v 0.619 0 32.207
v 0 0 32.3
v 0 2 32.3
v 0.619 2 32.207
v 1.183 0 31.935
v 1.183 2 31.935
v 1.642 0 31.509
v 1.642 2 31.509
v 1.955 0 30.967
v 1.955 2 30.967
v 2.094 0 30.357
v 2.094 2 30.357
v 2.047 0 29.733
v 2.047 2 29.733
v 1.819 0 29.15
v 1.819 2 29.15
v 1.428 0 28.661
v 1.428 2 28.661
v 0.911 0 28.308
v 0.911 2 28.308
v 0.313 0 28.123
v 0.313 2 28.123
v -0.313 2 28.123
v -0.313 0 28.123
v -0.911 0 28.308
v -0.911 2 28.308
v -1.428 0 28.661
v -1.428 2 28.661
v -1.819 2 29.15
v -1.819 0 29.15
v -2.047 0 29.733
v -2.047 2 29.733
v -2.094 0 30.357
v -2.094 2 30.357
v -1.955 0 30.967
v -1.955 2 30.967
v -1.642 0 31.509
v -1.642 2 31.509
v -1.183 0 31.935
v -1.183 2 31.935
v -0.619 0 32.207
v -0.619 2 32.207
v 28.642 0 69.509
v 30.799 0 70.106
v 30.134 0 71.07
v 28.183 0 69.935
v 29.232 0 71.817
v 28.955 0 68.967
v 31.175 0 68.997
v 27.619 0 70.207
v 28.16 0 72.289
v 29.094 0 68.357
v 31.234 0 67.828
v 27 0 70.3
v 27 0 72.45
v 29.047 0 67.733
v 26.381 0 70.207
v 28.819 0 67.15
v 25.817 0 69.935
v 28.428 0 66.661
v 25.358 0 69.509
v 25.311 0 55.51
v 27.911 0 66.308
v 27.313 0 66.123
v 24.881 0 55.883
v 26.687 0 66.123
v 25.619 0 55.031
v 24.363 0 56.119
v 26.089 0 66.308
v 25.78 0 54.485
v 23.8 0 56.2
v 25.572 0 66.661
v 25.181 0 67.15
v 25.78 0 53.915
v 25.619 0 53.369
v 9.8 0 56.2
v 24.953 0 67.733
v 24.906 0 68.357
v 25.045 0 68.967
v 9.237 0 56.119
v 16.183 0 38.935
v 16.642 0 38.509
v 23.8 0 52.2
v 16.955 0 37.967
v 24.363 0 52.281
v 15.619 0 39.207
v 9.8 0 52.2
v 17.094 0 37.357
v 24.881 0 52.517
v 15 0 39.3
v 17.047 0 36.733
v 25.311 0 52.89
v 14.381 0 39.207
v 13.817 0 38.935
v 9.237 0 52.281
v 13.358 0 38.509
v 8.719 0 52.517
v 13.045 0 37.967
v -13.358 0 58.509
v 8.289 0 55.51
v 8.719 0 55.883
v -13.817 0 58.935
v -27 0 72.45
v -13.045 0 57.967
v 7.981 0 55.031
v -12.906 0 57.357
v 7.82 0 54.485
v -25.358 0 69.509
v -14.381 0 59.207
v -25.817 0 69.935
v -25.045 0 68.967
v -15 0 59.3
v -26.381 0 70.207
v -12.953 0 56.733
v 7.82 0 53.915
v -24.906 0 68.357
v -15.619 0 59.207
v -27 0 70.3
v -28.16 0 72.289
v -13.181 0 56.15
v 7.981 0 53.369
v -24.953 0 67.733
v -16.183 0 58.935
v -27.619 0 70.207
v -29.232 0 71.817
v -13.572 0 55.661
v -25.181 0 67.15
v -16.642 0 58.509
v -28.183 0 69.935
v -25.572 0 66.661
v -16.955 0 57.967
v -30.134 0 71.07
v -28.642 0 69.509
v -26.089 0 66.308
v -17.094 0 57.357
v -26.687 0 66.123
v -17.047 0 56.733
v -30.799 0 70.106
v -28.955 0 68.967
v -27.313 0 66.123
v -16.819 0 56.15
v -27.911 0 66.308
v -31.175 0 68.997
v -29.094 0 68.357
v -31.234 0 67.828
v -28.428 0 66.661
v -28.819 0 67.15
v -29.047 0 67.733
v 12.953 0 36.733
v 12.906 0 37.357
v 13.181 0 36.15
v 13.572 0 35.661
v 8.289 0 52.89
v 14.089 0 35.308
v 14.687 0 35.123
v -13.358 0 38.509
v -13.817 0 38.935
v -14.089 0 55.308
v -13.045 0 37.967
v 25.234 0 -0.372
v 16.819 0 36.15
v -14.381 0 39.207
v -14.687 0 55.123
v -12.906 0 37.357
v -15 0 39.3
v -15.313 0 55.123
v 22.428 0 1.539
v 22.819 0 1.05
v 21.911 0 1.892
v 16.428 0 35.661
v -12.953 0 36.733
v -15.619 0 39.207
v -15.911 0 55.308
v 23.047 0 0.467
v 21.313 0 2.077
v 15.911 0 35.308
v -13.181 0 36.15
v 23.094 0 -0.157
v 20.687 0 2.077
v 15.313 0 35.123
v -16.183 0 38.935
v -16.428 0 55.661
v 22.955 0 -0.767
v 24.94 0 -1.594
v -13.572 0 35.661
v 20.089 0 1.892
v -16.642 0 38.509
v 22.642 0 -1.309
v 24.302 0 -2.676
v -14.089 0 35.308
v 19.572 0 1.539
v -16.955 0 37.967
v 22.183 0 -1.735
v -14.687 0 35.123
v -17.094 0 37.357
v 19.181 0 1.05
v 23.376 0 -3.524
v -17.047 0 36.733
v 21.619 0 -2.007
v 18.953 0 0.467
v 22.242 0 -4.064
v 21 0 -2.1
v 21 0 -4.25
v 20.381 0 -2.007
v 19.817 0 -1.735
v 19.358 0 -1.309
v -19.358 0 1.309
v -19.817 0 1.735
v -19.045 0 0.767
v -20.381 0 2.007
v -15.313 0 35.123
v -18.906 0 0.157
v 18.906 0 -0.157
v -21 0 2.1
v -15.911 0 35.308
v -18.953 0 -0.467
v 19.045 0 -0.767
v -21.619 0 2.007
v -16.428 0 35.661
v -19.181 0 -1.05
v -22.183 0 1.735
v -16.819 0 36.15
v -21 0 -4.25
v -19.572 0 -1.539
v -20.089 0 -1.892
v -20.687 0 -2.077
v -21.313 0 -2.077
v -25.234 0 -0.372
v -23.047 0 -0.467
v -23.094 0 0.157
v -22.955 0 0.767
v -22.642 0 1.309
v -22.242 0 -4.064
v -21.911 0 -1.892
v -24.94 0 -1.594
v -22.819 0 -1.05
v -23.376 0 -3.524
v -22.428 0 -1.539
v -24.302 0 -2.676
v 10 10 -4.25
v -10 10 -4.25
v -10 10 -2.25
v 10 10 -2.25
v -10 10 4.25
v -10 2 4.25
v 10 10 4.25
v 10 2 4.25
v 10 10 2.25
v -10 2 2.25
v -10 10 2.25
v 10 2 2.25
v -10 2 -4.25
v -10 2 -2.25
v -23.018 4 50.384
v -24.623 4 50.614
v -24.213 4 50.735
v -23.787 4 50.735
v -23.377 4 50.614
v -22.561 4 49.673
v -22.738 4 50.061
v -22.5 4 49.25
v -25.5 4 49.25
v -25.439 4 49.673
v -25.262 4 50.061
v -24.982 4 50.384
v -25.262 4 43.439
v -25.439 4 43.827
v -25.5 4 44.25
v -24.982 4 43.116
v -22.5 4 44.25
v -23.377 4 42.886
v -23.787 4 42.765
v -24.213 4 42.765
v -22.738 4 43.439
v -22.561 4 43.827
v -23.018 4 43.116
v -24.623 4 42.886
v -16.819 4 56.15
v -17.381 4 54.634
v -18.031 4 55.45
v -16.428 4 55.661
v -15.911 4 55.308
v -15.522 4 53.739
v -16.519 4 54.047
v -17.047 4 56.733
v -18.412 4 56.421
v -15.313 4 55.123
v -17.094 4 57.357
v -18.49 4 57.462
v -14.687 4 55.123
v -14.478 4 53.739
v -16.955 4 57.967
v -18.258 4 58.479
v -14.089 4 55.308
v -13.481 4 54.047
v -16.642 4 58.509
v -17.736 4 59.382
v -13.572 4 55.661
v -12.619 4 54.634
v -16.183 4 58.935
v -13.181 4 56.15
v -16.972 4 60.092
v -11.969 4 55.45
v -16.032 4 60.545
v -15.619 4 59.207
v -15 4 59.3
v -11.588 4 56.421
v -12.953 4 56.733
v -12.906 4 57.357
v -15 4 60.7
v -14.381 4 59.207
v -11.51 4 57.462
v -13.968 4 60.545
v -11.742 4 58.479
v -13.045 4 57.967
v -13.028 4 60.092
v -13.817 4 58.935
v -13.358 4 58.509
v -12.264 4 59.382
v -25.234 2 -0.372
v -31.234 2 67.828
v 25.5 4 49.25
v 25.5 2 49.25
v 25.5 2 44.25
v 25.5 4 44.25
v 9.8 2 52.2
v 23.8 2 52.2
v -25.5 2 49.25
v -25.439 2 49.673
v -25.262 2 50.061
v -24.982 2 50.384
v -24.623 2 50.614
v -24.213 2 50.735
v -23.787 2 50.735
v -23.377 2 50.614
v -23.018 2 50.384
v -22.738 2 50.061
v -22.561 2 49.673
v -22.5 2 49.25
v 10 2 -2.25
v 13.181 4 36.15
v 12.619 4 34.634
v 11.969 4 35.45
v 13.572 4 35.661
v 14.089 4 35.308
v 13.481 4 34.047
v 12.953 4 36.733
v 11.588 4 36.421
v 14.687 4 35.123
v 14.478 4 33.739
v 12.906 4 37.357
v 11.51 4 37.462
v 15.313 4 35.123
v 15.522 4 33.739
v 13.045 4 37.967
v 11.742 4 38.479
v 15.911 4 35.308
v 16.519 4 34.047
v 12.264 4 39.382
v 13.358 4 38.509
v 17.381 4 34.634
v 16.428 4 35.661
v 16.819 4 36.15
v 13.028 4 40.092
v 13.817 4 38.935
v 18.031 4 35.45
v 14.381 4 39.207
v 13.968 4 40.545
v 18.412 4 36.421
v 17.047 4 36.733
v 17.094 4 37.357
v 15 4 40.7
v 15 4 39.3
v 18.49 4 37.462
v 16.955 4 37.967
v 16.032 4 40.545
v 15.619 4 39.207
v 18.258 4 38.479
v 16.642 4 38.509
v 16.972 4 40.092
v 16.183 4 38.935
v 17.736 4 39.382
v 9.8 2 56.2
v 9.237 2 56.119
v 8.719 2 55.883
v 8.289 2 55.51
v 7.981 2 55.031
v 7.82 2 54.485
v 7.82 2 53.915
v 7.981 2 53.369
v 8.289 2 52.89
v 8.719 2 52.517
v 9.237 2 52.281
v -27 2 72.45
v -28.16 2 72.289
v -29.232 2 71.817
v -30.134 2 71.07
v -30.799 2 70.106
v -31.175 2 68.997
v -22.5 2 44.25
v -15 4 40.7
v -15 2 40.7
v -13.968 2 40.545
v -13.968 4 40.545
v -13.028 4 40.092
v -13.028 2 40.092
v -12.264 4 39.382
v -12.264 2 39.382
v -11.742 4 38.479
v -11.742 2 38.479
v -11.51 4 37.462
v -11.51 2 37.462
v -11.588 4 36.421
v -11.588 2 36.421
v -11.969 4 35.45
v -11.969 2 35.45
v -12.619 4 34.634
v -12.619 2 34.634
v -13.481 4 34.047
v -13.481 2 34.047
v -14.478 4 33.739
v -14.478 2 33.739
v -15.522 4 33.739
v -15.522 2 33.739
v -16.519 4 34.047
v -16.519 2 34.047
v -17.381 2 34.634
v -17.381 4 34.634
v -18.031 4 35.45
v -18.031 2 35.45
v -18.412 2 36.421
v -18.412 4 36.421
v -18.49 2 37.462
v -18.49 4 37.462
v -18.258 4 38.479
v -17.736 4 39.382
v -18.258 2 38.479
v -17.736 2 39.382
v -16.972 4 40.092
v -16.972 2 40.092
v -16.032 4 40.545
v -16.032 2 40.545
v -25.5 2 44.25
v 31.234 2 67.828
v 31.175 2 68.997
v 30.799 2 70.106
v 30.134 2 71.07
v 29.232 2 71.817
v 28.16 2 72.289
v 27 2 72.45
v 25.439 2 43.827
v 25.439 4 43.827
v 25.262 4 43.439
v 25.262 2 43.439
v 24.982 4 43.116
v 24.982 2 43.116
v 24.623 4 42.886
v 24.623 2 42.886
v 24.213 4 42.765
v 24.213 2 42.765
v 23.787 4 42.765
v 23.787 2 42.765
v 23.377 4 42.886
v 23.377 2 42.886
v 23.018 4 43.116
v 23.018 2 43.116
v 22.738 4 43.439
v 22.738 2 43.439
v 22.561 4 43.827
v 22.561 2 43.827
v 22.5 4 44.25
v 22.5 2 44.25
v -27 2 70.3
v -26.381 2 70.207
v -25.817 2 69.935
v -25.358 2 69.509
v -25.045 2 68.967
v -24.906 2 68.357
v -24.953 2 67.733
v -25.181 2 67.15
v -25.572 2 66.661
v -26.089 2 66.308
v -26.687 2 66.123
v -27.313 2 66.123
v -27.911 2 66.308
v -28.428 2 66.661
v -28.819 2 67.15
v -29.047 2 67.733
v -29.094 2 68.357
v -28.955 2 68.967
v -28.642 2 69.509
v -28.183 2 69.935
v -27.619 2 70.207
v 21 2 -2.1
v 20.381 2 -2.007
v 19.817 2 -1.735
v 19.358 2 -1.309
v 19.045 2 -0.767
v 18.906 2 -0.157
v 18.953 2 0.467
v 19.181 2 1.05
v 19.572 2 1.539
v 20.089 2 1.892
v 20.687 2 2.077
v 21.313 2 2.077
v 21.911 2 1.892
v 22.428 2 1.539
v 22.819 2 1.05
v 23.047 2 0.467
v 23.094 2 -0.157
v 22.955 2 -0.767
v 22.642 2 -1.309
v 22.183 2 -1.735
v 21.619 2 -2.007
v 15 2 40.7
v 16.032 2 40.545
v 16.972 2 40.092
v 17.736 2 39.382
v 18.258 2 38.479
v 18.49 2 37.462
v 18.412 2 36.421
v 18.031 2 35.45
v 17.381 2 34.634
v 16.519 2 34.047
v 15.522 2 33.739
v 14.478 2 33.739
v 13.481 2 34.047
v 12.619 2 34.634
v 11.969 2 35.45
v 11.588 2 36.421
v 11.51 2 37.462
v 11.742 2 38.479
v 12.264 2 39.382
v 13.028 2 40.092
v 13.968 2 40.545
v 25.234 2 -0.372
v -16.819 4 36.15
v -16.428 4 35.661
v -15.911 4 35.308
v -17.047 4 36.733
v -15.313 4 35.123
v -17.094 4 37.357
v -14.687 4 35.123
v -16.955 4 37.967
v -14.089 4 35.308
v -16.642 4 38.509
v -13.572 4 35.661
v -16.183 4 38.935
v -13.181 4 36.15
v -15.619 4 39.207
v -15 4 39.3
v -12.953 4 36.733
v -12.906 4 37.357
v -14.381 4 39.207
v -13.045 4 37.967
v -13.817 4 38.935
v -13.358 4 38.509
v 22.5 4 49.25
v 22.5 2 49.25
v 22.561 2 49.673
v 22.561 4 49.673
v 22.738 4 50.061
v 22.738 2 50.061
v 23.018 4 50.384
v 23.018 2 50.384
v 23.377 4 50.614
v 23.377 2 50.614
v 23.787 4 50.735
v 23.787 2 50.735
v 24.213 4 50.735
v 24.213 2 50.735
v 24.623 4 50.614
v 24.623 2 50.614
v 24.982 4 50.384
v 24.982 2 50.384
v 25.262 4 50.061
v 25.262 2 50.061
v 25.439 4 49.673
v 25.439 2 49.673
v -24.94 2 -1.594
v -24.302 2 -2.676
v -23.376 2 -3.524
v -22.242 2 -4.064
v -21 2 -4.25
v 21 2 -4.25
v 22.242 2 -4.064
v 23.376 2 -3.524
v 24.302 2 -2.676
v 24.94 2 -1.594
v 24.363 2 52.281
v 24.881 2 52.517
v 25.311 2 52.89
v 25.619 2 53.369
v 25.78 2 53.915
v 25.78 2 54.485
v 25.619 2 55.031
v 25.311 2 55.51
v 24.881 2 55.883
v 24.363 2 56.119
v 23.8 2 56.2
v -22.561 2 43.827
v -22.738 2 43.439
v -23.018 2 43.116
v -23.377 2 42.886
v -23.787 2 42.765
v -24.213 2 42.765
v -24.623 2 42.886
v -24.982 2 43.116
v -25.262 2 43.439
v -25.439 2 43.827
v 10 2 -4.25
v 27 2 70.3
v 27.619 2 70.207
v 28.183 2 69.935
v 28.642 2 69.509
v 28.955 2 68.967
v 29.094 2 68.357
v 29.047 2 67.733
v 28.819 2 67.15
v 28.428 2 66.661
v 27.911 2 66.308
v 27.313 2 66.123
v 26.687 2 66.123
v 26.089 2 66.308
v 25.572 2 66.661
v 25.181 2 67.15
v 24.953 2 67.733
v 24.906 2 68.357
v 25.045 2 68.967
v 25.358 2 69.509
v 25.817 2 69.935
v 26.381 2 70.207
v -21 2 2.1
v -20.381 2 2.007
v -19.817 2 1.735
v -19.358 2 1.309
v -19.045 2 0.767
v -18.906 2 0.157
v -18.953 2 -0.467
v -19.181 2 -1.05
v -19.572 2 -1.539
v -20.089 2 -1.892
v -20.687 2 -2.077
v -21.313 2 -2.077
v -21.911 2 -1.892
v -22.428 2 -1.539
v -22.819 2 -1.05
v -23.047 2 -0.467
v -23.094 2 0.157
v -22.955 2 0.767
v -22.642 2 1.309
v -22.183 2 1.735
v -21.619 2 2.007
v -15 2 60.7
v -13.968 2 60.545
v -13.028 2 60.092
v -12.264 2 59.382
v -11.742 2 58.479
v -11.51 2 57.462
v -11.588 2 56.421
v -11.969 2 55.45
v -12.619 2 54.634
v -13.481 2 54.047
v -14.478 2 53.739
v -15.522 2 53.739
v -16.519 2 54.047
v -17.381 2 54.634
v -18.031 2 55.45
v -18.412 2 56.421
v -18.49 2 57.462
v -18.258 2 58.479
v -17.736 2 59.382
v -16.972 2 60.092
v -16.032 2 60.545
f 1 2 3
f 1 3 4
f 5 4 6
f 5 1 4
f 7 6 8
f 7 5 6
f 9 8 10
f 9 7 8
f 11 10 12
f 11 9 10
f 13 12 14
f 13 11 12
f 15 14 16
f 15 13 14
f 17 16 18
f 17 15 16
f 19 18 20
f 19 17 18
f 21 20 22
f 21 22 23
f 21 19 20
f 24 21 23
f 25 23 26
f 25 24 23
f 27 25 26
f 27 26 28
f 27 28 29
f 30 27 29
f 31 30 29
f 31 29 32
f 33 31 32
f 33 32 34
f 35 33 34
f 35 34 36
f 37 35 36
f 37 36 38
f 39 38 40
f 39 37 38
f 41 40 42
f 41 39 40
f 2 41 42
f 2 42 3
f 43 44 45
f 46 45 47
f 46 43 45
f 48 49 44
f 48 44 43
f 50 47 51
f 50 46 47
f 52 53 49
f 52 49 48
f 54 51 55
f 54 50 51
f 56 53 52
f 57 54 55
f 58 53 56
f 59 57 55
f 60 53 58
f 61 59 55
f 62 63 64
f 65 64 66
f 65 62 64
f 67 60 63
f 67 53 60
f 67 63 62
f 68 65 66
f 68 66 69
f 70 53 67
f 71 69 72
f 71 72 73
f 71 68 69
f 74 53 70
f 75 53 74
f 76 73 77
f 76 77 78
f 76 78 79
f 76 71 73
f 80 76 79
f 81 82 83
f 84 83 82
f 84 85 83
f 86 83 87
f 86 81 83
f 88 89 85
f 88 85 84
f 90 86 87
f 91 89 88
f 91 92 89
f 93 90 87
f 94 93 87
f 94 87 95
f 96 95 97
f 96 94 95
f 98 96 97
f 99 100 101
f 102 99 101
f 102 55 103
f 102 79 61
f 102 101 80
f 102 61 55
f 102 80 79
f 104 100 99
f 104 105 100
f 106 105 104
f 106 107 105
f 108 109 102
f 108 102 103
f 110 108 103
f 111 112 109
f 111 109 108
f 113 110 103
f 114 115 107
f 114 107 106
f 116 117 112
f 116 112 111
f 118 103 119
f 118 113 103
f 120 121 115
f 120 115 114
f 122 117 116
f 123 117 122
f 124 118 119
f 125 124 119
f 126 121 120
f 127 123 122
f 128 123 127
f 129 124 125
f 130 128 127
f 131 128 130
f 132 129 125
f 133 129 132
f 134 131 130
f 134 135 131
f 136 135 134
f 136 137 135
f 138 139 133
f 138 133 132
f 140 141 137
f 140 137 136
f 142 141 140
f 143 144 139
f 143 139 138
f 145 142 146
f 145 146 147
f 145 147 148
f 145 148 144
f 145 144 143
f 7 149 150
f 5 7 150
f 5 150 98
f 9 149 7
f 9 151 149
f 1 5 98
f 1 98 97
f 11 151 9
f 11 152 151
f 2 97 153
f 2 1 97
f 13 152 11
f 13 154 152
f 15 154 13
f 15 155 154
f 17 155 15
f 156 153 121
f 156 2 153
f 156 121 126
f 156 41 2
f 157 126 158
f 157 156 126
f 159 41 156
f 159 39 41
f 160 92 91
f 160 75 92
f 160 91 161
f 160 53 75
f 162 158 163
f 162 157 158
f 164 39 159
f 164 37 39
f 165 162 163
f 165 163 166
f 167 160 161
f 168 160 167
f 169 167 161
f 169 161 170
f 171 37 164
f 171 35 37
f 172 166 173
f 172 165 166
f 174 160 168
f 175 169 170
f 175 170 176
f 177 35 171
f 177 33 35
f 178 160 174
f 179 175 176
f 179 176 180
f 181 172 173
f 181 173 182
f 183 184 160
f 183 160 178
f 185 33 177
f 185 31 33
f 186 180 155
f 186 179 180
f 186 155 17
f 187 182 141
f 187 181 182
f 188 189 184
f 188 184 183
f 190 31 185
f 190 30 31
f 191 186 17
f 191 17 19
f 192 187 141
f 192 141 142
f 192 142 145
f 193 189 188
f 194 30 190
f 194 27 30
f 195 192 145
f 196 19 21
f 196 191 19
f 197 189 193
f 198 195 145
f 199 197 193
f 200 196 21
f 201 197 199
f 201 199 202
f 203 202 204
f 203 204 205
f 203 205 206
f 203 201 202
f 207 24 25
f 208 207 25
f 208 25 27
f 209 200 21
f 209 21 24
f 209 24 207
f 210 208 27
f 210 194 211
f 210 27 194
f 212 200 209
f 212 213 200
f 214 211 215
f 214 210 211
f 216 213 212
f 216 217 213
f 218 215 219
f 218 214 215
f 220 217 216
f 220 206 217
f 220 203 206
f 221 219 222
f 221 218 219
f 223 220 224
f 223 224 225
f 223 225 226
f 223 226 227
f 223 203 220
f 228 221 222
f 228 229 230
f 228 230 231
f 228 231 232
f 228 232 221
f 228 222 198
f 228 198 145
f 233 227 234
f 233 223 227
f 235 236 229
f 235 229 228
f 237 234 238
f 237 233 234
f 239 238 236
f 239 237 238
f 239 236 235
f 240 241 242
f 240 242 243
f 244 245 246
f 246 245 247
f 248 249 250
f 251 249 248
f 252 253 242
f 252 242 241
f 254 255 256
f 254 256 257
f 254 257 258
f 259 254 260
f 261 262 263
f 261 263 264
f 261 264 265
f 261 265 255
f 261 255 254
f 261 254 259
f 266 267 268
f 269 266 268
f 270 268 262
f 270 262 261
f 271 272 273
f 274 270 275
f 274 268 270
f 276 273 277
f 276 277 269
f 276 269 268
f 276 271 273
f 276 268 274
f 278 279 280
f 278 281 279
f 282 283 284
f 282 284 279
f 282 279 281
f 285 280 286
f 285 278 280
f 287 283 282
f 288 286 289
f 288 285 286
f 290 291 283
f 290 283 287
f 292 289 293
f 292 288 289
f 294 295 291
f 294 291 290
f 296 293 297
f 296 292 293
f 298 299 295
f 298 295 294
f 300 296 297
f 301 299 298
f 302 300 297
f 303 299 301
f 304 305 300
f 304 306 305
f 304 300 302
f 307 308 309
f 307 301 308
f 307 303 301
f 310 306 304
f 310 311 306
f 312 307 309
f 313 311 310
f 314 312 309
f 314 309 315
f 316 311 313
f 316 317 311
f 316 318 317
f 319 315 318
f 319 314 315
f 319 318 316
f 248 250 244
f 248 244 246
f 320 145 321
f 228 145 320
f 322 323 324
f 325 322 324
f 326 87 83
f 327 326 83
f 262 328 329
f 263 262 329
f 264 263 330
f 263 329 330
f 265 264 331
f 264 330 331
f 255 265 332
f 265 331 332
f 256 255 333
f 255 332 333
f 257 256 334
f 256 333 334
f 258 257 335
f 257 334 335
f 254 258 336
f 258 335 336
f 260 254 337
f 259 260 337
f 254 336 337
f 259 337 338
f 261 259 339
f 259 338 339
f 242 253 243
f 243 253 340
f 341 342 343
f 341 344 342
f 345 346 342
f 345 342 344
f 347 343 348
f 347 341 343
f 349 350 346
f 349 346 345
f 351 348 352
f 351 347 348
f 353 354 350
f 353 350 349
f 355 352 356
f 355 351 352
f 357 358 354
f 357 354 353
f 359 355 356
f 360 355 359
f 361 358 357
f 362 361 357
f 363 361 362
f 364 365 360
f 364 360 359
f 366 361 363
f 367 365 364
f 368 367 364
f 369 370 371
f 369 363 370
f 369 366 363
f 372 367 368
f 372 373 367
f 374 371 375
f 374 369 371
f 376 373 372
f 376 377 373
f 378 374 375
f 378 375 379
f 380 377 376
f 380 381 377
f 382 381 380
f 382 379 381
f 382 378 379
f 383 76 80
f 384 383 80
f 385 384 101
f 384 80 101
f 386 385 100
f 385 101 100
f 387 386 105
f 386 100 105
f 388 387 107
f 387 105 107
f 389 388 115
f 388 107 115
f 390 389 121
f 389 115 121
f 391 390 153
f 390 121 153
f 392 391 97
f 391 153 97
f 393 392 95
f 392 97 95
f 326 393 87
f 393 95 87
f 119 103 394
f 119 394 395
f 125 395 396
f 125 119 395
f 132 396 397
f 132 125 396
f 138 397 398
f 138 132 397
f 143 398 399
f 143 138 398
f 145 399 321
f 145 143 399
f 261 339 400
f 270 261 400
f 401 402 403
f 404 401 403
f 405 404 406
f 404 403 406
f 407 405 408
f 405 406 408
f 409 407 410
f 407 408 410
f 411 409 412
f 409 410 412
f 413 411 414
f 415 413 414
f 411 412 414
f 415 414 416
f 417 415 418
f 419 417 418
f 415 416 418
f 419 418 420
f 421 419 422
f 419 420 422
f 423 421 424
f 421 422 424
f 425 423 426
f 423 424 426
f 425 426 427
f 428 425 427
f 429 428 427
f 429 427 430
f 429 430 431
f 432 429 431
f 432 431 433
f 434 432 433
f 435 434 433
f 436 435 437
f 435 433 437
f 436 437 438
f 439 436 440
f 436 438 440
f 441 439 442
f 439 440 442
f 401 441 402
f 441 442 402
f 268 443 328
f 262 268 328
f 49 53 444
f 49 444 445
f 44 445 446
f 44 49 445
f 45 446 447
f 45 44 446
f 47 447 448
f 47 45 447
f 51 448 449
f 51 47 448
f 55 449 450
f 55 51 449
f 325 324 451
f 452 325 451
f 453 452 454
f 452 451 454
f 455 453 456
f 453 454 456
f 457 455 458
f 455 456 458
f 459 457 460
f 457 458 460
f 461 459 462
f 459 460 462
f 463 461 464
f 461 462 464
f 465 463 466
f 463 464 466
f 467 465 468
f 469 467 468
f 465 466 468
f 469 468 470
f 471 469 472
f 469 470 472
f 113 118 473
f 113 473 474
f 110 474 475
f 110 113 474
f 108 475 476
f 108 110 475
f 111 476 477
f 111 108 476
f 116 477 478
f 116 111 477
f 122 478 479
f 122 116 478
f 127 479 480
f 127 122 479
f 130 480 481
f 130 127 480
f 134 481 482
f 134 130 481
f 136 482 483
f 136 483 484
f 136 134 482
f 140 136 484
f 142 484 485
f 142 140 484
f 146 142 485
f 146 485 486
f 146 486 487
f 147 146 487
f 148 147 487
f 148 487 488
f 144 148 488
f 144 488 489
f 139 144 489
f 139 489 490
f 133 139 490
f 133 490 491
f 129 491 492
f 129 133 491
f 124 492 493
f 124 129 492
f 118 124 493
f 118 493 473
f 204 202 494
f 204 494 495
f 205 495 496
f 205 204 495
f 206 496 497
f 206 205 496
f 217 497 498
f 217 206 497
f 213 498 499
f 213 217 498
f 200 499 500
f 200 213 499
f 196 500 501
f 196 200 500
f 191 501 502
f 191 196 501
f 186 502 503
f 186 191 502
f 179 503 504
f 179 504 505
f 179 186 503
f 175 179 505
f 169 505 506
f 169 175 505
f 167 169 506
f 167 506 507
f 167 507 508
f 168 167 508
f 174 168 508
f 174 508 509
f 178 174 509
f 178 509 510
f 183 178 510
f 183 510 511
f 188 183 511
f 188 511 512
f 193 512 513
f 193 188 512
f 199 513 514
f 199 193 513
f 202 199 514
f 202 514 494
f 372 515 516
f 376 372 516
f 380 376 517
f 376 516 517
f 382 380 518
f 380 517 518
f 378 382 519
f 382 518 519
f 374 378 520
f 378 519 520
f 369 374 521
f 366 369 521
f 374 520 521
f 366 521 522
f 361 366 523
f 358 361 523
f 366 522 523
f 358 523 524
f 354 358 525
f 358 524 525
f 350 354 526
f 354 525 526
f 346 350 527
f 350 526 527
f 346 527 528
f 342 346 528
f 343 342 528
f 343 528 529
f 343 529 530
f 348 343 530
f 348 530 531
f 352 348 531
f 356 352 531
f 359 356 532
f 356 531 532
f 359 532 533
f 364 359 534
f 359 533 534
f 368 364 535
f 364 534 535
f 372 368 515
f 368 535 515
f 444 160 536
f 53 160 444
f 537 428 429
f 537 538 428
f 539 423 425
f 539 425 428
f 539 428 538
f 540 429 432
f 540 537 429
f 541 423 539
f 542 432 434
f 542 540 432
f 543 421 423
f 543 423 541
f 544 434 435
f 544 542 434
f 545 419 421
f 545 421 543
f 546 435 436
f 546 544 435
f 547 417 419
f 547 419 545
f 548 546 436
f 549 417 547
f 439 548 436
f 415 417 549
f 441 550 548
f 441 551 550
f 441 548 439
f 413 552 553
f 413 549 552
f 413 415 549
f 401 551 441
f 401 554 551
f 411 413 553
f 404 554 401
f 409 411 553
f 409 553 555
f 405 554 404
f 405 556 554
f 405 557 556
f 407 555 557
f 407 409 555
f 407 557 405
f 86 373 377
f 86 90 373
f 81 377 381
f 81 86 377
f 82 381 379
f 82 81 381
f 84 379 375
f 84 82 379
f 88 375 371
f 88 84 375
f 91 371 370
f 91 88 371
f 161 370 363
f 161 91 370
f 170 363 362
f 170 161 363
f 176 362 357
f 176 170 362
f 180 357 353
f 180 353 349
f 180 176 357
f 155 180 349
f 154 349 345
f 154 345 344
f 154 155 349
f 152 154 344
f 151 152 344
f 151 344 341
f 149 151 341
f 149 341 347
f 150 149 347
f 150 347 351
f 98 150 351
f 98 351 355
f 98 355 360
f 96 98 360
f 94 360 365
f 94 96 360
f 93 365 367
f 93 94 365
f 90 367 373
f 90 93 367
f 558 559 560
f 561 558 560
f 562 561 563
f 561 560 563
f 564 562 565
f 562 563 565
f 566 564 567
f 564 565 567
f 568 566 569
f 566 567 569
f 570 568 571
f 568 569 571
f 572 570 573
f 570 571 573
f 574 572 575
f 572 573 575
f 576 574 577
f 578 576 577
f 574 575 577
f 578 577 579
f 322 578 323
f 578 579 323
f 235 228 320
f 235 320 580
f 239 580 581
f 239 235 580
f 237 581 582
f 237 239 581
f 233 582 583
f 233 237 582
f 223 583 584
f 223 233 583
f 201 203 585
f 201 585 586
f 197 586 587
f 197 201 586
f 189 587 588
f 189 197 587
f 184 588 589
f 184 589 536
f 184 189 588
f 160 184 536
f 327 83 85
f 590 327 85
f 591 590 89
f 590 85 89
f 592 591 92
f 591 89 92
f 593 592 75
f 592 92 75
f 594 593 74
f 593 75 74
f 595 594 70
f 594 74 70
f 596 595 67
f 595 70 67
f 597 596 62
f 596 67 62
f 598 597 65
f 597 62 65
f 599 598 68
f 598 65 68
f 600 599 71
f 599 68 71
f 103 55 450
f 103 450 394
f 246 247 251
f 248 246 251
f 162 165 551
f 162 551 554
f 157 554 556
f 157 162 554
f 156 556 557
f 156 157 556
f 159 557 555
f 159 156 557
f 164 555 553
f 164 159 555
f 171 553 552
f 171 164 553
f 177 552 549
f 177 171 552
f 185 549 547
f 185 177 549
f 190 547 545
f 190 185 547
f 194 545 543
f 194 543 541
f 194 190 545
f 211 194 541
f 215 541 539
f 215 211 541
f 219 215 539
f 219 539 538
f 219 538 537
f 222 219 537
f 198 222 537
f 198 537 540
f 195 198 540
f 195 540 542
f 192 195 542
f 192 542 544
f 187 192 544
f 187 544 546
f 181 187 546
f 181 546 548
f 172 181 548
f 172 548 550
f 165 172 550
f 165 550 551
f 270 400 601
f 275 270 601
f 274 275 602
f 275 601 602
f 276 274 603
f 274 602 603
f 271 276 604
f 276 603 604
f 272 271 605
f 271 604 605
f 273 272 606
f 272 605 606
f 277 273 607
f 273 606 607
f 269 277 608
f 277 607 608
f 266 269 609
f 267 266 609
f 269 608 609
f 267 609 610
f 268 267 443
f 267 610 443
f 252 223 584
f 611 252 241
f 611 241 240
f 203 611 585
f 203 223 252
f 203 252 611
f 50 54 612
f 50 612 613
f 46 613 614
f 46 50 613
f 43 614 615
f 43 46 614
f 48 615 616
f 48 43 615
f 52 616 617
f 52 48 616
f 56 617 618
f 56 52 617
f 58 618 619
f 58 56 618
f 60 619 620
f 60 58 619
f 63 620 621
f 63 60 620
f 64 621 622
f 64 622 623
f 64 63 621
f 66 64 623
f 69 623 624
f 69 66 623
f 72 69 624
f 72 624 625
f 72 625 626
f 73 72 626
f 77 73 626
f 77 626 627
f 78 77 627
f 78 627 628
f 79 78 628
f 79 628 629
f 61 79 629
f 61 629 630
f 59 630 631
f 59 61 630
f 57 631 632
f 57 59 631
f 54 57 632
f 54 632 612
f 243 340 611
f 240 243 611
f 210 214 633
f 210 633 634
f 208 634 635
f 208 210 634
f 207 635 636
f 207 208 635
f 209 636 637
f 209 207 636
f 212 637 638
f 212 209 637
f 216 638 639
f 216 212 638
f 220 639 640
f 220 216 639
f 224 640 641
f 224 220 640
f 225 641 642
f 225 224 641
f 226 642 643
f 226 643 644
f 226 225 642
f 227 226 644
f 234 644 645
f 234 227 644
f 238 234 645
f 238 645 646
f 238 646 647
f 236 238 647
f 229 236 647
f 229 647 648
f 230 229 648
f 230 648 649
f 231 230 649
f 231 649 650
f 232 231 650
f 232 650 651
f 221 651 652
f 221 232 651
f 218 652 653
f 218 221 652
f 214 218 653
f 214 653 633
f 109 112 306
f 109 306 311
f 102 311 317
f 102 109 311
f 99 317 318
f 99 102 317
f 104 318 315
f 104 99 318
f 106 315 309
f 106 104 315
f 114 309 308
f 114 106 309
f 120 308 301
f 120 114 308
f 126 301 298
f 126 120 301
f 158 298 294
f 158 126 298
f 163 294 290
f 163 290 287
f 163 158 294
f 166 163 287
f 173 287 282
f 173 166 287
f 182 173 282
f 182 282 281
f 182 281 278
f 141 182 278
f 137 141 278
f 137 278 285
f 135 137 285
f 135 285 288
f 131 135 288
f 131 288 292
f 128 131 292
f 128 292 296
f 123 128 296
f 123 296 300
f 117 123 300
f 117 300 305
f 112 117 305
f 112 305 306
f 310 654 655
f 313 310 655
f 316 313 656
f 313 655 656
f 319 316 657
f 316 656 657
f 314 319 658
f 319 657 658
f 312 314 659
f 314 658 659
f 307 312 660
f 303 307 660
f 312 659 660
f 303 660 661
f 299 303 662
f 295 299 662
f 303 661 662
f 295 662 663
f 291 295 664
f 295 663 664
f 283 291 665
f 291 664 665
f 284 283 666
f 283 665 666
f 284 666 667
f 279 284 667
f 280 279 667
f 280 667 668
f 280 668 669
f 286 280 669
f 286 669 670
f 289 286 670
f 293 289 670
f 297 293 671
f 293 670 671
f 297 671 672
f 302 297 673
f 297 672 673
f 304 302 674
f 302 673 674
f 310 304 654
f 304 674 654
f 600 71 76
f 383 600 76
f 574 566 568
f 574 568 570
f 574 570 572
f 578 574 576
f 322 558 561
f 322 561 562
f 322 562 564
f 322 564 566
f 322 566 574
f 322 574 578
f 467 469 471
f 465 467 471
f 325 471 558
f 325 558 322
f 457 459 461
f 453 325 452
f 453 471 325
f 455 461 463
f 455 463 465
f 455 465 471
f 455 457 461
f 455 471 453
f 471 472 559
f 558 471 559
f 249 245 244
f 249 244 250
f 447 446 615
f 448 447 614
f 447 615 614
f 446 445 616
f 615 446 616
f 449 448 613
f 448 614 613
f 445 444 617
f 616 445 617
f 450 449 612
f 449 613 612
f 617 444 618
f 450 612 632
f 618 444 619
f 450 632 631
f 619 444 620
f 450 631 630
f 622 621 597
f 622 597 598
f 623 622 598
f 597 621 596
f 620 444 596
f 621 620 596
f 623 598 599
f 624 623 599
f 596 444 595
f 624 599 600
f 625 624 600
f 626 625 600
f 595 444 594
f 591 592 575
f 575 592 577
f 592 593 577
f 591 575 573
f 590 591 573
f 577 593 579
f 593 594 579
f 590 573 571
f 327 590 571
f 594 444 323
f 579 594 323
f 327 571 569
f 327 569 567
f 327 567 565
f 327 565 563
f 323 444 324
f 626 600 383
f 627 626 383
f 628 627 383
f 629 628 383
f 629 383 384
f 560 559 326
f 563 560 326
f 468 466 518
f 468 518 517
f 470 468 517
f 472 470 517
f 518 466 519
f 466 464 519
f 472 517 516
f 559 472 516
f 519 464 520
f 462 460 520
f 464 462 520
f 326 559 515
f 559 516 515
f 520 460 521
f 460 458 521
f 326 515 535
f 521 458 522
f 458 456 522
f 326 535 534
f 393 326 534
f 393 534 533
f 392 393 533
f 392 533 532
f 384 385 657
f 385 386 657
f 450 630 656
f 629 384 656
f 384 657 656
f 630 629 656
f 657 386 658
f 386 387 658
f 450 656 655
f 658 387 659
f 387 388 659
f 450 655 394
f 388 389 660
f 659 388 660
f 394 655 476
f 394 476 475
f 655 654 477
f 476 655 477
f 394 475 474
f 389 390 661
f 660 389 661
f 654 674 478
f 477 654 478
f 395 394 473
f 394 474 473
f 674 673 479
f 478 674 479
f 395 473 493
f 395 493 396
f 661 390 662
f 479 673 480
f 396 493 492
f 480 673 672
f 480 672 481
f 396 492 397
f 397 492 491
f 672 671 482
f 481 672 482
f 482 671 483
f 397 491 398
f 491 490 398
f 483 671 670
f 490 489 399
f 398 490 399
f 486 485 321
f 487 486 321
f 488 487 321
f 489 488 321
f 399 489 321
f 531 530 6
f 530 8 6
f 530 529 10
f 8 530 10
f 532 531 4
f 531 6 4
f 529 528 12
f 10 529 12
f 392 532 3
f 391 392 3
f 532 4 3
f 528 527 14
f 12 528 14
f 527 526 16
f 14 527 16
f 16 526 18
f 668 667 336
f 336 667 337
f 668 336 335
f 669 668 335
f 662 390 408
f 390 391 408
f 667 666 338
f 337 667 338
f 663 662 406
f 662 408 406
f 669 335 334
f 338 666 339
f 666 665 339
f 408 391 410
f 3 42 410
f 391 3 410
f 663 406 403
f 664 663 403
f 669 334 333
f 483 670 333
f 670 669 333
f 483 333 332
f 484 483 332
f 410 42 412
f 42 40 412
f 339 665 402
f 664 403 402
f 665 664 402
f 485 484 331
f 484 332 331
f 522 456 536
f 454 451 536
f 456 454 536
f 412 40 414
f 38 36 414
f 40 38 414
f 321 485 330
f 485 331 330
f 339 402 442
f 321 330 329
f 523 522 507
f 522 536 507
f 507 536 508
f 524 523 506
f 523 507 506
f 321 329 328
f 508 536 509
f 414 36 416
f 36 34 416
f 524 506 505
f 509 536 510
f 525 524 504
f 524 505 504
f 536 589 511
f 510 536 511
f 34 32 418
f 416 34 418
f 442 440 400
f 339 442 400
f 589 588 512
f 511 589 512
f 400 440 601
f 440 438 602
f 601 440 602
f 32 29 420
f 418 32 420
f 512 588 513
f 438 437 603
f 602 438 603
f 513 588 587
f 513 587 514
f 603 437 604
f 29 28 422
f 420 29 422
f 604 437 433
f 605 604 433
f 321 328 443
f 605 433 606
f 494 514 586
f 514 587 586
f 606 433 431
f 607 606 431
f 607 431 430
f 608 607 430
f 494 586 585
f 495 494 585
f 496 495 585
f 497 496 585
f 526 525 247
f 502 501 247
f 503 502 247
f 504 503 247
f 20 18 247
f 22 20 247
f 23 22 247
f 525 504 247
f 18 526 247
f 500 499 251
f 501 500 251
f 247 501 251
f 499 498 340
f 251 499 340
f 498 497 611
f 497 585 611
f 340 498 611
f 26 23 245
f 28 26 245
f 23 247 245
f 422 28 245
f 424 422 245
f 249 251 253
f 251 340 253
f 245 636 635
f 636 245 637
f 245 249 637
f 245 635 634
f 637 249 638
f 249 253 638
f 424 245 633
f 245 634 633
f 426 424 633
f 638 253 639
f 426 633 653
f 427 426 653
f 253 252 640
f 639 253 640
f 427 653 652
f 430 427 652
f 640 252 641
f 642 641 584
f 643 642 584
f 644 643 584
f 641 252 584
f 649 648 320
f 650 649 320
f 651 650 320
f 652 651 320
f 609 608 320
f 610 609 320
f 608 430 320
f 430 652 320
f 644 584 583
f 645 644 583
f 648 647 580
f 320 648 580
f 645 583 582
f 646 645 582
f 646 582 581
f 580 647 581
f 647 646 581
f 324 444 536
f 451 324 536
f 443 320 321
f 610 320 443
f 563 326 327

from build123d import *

# Parameters (mm, degrees)
CROQUIS1_R              = 2.1
SALIENTE_EXTRUIR1_DEPTH = 2
CROQUIS2_W              = 20
CROQUIS2_H              = 2
SALIENTE_EXTRUIR2_DEPTH = 8
CROQUIS3_R              = 3.5
CROQUIS3_R_2            = 2.1
SALIENTE_EXTRUIR3_DEPTH = 2


with BuildPart() as part:
    # Croquis1 → Saliente-Extruir1 (new body)
    with BuildSketch(Plane(origin=(0, 0, 0), x_dir=(1, 0, 0), z_dir=(0, 1, 0))):
        with BuildLine():
            Line((-21, 4.25), (21, 4.25))
            ThreePointArc((21, 4.25), (23.870499774, 3.134123649), (25.233647636, 0.372461669))
            Line((25.233647636, 0.372461669), (31.233647636, -67.827538331))
            ThreePointArc((31.233647636, -67.827538331), (30.134123649, -71.070499774), (27, -72.45))
            Line((27, -72.45), (-27, -72.45))
            ThreePointArc((-27, -72.45), (-30.134123649, -71.070499774), (-31.233647636, -67.827538331))
            Line((-31.233647636, -67.827538331), (-25.233647636, 0.372461669))
            ThreePointArc((-25.233647636, 0.372461669), (-23.870499774, 3.134123649), (-21, 4.25))
        make_face()
        with Locations(Location((-21, 0, 0), (0, 0, 270))):
            Circle(CROQUIS1_R, mode=Mode.SUBTRACT)
        with Locations(Location((21, 0, 0), (0, 0, 90))):
            Circle(CROQUIS1_R, mode=Mode.SUBTRACT)
        with Locations(Location((0, -30.2, 0), (0, 0, 270))):
            Circle(CROQUIS1_R, mode=Mode.SUBTRACT)
        with Locations(Location((-27, -68.2, 0), (0, 0, 270))):
            Circle(CROQUIS1_R, mode=Mode.SUBTRACT)
        with Locations(Location((27, -68.2, 0), (0, 0, 270))):
            Circle(CROQUIS1_R, mode=Mode.SUBTRACT)
        with Locations(Location((-15, -37.2, 0), (0, 0, 270))):
            Circle(CROQUIS1_R, mode=Mode.SUBTRACT)
        with Locations(Location((-15, -57.2, 0), (0, 0, 270))):
            Circle(CROQUIS1_R, mode=Mode.SUBTRACT)
        with Locations(Location((15, -37.2, 0), (0, 0, 270))):
            Circle(CROQUIS1_R, mode=Mode.SUBTRACT)
        with BuildLine():
            Line((9.8, -52.2), (23.8, -52.2))
            ThreePointArc((23.8, -52.2), (25.8, -54.2), (23.8, -56.2))
            Line((23.8, -56.2), (9.8, -56.2))
            ThreePointArc((9.8, -56.2), (7.8, -54.2), (9.8, -52.2))
        make_face(mode=Mode.SUBTRACT)
    extrude(amount=SALIENTE_EXTRUIR1_DEPTH)

    # Croquis2 → Saliente-Extruir2 (add)
    with BuildSketch(Plane(origin=(0, 2, 0), x_dir=(1, 0, 0), z_dir=(0, 1, 0))):
        with Locations((0, -3.25)):
            Rectangle(CROQUIS2_W, CROQUIS2_H)
        with Locations((0, 3.25)):
            Rectangle(CROQUIS2_W, CROQUIS2_H)
    extrude(amount=SALIENTE_EXTRUIR2_DEPTH)

    # Croquis3 → Saliente-Extruir3 (add)
    # profile 1 of 5: a face of its own
    with BuildSketch(Plane(origin=(0, 2, 0), x_dir=(1, 0, 0), z_dir=(0, 1, 0))):
        with Locations(Location((15, -37.2, 0), (0, 0, 270))):
            Circle(CROQUIS3_R)
        with Locations(Location((15, -37.2, 0), (0, 0, 270))):
            Circle(CROQUIS3_R_2, mode=Mode.SUBTRACT)
    # profile 2 of 5: a face of its own
    with BuildSketch(Plane(origin=(0, 2, 0), x_dir=(1, 0, 0), z_dir=(0, 1, 0))):
        with Locations(Location((-15, -37.2, 0), (0, 0, 270))):
            Circle(CROQUIS3_R)
        with Locations(Location((-15, -37.2, 0), (0, 0, 270))):
            Circle(CROQUIS3_R_2, mode=Mode.SUBTRACT)
    # profile 3 of 5: a face of its own
    with BuildSketch(Plane(origin=(0, 2, 0), x_dir=(1, 0, 0), z_dir=(0, 1, 0))):
        with Locations(Location((-15, -57.2, 0), (0, 0, 270))):
            Circle(CROQUIS3_R)
        with Locations(Location((-15, -57.2, 0), (0, 0, 270))):
            Circle(CROQUIS3_R_2, mode=Mode.SUBTRACT)
    # profile 4 of 5: a face of its own
    with BuildSketch(Plane(origin=(0, 2, 0), x_dir=(1, 0, 0), z_dir=(0, 1, 0))):
        with BuildLine():
            Line((-25.5, -44.25), (-25.5, -49.25))
            ThreePointArc((-25.5, -49.25), (-24, -50.75), (-22.5, -49.25))
            Line((-22.5, -49.25), (-22.5, -44.25))
            ThreePointArc((-22.5, -44.25), (-24, -42.75), (-25.5, -44.25))
        make_face()
    # profile 5 of 5: a face of its own
    with BuildSketch(Plane(origin=(0, 2, 0), x_dir=(1, 0, 0), z_dir=(0, 1, 0))):
        with BuildLine():
            Line((22.5, -44.25), (22.5, -49.25))
            ThreePointArc((22.5, -49.25), (24, -50.75), (25.5, -49.25))
            Line((25.5, -49.25), (25.5, -44.25))
            ThreePointArc((25.5, -44.25), (24, -42.75), (22.5, -44.25))
        make_face()
    extrude(amount=SALIENTE_EXTRUIR3_DEPTH)


solid = part.part
